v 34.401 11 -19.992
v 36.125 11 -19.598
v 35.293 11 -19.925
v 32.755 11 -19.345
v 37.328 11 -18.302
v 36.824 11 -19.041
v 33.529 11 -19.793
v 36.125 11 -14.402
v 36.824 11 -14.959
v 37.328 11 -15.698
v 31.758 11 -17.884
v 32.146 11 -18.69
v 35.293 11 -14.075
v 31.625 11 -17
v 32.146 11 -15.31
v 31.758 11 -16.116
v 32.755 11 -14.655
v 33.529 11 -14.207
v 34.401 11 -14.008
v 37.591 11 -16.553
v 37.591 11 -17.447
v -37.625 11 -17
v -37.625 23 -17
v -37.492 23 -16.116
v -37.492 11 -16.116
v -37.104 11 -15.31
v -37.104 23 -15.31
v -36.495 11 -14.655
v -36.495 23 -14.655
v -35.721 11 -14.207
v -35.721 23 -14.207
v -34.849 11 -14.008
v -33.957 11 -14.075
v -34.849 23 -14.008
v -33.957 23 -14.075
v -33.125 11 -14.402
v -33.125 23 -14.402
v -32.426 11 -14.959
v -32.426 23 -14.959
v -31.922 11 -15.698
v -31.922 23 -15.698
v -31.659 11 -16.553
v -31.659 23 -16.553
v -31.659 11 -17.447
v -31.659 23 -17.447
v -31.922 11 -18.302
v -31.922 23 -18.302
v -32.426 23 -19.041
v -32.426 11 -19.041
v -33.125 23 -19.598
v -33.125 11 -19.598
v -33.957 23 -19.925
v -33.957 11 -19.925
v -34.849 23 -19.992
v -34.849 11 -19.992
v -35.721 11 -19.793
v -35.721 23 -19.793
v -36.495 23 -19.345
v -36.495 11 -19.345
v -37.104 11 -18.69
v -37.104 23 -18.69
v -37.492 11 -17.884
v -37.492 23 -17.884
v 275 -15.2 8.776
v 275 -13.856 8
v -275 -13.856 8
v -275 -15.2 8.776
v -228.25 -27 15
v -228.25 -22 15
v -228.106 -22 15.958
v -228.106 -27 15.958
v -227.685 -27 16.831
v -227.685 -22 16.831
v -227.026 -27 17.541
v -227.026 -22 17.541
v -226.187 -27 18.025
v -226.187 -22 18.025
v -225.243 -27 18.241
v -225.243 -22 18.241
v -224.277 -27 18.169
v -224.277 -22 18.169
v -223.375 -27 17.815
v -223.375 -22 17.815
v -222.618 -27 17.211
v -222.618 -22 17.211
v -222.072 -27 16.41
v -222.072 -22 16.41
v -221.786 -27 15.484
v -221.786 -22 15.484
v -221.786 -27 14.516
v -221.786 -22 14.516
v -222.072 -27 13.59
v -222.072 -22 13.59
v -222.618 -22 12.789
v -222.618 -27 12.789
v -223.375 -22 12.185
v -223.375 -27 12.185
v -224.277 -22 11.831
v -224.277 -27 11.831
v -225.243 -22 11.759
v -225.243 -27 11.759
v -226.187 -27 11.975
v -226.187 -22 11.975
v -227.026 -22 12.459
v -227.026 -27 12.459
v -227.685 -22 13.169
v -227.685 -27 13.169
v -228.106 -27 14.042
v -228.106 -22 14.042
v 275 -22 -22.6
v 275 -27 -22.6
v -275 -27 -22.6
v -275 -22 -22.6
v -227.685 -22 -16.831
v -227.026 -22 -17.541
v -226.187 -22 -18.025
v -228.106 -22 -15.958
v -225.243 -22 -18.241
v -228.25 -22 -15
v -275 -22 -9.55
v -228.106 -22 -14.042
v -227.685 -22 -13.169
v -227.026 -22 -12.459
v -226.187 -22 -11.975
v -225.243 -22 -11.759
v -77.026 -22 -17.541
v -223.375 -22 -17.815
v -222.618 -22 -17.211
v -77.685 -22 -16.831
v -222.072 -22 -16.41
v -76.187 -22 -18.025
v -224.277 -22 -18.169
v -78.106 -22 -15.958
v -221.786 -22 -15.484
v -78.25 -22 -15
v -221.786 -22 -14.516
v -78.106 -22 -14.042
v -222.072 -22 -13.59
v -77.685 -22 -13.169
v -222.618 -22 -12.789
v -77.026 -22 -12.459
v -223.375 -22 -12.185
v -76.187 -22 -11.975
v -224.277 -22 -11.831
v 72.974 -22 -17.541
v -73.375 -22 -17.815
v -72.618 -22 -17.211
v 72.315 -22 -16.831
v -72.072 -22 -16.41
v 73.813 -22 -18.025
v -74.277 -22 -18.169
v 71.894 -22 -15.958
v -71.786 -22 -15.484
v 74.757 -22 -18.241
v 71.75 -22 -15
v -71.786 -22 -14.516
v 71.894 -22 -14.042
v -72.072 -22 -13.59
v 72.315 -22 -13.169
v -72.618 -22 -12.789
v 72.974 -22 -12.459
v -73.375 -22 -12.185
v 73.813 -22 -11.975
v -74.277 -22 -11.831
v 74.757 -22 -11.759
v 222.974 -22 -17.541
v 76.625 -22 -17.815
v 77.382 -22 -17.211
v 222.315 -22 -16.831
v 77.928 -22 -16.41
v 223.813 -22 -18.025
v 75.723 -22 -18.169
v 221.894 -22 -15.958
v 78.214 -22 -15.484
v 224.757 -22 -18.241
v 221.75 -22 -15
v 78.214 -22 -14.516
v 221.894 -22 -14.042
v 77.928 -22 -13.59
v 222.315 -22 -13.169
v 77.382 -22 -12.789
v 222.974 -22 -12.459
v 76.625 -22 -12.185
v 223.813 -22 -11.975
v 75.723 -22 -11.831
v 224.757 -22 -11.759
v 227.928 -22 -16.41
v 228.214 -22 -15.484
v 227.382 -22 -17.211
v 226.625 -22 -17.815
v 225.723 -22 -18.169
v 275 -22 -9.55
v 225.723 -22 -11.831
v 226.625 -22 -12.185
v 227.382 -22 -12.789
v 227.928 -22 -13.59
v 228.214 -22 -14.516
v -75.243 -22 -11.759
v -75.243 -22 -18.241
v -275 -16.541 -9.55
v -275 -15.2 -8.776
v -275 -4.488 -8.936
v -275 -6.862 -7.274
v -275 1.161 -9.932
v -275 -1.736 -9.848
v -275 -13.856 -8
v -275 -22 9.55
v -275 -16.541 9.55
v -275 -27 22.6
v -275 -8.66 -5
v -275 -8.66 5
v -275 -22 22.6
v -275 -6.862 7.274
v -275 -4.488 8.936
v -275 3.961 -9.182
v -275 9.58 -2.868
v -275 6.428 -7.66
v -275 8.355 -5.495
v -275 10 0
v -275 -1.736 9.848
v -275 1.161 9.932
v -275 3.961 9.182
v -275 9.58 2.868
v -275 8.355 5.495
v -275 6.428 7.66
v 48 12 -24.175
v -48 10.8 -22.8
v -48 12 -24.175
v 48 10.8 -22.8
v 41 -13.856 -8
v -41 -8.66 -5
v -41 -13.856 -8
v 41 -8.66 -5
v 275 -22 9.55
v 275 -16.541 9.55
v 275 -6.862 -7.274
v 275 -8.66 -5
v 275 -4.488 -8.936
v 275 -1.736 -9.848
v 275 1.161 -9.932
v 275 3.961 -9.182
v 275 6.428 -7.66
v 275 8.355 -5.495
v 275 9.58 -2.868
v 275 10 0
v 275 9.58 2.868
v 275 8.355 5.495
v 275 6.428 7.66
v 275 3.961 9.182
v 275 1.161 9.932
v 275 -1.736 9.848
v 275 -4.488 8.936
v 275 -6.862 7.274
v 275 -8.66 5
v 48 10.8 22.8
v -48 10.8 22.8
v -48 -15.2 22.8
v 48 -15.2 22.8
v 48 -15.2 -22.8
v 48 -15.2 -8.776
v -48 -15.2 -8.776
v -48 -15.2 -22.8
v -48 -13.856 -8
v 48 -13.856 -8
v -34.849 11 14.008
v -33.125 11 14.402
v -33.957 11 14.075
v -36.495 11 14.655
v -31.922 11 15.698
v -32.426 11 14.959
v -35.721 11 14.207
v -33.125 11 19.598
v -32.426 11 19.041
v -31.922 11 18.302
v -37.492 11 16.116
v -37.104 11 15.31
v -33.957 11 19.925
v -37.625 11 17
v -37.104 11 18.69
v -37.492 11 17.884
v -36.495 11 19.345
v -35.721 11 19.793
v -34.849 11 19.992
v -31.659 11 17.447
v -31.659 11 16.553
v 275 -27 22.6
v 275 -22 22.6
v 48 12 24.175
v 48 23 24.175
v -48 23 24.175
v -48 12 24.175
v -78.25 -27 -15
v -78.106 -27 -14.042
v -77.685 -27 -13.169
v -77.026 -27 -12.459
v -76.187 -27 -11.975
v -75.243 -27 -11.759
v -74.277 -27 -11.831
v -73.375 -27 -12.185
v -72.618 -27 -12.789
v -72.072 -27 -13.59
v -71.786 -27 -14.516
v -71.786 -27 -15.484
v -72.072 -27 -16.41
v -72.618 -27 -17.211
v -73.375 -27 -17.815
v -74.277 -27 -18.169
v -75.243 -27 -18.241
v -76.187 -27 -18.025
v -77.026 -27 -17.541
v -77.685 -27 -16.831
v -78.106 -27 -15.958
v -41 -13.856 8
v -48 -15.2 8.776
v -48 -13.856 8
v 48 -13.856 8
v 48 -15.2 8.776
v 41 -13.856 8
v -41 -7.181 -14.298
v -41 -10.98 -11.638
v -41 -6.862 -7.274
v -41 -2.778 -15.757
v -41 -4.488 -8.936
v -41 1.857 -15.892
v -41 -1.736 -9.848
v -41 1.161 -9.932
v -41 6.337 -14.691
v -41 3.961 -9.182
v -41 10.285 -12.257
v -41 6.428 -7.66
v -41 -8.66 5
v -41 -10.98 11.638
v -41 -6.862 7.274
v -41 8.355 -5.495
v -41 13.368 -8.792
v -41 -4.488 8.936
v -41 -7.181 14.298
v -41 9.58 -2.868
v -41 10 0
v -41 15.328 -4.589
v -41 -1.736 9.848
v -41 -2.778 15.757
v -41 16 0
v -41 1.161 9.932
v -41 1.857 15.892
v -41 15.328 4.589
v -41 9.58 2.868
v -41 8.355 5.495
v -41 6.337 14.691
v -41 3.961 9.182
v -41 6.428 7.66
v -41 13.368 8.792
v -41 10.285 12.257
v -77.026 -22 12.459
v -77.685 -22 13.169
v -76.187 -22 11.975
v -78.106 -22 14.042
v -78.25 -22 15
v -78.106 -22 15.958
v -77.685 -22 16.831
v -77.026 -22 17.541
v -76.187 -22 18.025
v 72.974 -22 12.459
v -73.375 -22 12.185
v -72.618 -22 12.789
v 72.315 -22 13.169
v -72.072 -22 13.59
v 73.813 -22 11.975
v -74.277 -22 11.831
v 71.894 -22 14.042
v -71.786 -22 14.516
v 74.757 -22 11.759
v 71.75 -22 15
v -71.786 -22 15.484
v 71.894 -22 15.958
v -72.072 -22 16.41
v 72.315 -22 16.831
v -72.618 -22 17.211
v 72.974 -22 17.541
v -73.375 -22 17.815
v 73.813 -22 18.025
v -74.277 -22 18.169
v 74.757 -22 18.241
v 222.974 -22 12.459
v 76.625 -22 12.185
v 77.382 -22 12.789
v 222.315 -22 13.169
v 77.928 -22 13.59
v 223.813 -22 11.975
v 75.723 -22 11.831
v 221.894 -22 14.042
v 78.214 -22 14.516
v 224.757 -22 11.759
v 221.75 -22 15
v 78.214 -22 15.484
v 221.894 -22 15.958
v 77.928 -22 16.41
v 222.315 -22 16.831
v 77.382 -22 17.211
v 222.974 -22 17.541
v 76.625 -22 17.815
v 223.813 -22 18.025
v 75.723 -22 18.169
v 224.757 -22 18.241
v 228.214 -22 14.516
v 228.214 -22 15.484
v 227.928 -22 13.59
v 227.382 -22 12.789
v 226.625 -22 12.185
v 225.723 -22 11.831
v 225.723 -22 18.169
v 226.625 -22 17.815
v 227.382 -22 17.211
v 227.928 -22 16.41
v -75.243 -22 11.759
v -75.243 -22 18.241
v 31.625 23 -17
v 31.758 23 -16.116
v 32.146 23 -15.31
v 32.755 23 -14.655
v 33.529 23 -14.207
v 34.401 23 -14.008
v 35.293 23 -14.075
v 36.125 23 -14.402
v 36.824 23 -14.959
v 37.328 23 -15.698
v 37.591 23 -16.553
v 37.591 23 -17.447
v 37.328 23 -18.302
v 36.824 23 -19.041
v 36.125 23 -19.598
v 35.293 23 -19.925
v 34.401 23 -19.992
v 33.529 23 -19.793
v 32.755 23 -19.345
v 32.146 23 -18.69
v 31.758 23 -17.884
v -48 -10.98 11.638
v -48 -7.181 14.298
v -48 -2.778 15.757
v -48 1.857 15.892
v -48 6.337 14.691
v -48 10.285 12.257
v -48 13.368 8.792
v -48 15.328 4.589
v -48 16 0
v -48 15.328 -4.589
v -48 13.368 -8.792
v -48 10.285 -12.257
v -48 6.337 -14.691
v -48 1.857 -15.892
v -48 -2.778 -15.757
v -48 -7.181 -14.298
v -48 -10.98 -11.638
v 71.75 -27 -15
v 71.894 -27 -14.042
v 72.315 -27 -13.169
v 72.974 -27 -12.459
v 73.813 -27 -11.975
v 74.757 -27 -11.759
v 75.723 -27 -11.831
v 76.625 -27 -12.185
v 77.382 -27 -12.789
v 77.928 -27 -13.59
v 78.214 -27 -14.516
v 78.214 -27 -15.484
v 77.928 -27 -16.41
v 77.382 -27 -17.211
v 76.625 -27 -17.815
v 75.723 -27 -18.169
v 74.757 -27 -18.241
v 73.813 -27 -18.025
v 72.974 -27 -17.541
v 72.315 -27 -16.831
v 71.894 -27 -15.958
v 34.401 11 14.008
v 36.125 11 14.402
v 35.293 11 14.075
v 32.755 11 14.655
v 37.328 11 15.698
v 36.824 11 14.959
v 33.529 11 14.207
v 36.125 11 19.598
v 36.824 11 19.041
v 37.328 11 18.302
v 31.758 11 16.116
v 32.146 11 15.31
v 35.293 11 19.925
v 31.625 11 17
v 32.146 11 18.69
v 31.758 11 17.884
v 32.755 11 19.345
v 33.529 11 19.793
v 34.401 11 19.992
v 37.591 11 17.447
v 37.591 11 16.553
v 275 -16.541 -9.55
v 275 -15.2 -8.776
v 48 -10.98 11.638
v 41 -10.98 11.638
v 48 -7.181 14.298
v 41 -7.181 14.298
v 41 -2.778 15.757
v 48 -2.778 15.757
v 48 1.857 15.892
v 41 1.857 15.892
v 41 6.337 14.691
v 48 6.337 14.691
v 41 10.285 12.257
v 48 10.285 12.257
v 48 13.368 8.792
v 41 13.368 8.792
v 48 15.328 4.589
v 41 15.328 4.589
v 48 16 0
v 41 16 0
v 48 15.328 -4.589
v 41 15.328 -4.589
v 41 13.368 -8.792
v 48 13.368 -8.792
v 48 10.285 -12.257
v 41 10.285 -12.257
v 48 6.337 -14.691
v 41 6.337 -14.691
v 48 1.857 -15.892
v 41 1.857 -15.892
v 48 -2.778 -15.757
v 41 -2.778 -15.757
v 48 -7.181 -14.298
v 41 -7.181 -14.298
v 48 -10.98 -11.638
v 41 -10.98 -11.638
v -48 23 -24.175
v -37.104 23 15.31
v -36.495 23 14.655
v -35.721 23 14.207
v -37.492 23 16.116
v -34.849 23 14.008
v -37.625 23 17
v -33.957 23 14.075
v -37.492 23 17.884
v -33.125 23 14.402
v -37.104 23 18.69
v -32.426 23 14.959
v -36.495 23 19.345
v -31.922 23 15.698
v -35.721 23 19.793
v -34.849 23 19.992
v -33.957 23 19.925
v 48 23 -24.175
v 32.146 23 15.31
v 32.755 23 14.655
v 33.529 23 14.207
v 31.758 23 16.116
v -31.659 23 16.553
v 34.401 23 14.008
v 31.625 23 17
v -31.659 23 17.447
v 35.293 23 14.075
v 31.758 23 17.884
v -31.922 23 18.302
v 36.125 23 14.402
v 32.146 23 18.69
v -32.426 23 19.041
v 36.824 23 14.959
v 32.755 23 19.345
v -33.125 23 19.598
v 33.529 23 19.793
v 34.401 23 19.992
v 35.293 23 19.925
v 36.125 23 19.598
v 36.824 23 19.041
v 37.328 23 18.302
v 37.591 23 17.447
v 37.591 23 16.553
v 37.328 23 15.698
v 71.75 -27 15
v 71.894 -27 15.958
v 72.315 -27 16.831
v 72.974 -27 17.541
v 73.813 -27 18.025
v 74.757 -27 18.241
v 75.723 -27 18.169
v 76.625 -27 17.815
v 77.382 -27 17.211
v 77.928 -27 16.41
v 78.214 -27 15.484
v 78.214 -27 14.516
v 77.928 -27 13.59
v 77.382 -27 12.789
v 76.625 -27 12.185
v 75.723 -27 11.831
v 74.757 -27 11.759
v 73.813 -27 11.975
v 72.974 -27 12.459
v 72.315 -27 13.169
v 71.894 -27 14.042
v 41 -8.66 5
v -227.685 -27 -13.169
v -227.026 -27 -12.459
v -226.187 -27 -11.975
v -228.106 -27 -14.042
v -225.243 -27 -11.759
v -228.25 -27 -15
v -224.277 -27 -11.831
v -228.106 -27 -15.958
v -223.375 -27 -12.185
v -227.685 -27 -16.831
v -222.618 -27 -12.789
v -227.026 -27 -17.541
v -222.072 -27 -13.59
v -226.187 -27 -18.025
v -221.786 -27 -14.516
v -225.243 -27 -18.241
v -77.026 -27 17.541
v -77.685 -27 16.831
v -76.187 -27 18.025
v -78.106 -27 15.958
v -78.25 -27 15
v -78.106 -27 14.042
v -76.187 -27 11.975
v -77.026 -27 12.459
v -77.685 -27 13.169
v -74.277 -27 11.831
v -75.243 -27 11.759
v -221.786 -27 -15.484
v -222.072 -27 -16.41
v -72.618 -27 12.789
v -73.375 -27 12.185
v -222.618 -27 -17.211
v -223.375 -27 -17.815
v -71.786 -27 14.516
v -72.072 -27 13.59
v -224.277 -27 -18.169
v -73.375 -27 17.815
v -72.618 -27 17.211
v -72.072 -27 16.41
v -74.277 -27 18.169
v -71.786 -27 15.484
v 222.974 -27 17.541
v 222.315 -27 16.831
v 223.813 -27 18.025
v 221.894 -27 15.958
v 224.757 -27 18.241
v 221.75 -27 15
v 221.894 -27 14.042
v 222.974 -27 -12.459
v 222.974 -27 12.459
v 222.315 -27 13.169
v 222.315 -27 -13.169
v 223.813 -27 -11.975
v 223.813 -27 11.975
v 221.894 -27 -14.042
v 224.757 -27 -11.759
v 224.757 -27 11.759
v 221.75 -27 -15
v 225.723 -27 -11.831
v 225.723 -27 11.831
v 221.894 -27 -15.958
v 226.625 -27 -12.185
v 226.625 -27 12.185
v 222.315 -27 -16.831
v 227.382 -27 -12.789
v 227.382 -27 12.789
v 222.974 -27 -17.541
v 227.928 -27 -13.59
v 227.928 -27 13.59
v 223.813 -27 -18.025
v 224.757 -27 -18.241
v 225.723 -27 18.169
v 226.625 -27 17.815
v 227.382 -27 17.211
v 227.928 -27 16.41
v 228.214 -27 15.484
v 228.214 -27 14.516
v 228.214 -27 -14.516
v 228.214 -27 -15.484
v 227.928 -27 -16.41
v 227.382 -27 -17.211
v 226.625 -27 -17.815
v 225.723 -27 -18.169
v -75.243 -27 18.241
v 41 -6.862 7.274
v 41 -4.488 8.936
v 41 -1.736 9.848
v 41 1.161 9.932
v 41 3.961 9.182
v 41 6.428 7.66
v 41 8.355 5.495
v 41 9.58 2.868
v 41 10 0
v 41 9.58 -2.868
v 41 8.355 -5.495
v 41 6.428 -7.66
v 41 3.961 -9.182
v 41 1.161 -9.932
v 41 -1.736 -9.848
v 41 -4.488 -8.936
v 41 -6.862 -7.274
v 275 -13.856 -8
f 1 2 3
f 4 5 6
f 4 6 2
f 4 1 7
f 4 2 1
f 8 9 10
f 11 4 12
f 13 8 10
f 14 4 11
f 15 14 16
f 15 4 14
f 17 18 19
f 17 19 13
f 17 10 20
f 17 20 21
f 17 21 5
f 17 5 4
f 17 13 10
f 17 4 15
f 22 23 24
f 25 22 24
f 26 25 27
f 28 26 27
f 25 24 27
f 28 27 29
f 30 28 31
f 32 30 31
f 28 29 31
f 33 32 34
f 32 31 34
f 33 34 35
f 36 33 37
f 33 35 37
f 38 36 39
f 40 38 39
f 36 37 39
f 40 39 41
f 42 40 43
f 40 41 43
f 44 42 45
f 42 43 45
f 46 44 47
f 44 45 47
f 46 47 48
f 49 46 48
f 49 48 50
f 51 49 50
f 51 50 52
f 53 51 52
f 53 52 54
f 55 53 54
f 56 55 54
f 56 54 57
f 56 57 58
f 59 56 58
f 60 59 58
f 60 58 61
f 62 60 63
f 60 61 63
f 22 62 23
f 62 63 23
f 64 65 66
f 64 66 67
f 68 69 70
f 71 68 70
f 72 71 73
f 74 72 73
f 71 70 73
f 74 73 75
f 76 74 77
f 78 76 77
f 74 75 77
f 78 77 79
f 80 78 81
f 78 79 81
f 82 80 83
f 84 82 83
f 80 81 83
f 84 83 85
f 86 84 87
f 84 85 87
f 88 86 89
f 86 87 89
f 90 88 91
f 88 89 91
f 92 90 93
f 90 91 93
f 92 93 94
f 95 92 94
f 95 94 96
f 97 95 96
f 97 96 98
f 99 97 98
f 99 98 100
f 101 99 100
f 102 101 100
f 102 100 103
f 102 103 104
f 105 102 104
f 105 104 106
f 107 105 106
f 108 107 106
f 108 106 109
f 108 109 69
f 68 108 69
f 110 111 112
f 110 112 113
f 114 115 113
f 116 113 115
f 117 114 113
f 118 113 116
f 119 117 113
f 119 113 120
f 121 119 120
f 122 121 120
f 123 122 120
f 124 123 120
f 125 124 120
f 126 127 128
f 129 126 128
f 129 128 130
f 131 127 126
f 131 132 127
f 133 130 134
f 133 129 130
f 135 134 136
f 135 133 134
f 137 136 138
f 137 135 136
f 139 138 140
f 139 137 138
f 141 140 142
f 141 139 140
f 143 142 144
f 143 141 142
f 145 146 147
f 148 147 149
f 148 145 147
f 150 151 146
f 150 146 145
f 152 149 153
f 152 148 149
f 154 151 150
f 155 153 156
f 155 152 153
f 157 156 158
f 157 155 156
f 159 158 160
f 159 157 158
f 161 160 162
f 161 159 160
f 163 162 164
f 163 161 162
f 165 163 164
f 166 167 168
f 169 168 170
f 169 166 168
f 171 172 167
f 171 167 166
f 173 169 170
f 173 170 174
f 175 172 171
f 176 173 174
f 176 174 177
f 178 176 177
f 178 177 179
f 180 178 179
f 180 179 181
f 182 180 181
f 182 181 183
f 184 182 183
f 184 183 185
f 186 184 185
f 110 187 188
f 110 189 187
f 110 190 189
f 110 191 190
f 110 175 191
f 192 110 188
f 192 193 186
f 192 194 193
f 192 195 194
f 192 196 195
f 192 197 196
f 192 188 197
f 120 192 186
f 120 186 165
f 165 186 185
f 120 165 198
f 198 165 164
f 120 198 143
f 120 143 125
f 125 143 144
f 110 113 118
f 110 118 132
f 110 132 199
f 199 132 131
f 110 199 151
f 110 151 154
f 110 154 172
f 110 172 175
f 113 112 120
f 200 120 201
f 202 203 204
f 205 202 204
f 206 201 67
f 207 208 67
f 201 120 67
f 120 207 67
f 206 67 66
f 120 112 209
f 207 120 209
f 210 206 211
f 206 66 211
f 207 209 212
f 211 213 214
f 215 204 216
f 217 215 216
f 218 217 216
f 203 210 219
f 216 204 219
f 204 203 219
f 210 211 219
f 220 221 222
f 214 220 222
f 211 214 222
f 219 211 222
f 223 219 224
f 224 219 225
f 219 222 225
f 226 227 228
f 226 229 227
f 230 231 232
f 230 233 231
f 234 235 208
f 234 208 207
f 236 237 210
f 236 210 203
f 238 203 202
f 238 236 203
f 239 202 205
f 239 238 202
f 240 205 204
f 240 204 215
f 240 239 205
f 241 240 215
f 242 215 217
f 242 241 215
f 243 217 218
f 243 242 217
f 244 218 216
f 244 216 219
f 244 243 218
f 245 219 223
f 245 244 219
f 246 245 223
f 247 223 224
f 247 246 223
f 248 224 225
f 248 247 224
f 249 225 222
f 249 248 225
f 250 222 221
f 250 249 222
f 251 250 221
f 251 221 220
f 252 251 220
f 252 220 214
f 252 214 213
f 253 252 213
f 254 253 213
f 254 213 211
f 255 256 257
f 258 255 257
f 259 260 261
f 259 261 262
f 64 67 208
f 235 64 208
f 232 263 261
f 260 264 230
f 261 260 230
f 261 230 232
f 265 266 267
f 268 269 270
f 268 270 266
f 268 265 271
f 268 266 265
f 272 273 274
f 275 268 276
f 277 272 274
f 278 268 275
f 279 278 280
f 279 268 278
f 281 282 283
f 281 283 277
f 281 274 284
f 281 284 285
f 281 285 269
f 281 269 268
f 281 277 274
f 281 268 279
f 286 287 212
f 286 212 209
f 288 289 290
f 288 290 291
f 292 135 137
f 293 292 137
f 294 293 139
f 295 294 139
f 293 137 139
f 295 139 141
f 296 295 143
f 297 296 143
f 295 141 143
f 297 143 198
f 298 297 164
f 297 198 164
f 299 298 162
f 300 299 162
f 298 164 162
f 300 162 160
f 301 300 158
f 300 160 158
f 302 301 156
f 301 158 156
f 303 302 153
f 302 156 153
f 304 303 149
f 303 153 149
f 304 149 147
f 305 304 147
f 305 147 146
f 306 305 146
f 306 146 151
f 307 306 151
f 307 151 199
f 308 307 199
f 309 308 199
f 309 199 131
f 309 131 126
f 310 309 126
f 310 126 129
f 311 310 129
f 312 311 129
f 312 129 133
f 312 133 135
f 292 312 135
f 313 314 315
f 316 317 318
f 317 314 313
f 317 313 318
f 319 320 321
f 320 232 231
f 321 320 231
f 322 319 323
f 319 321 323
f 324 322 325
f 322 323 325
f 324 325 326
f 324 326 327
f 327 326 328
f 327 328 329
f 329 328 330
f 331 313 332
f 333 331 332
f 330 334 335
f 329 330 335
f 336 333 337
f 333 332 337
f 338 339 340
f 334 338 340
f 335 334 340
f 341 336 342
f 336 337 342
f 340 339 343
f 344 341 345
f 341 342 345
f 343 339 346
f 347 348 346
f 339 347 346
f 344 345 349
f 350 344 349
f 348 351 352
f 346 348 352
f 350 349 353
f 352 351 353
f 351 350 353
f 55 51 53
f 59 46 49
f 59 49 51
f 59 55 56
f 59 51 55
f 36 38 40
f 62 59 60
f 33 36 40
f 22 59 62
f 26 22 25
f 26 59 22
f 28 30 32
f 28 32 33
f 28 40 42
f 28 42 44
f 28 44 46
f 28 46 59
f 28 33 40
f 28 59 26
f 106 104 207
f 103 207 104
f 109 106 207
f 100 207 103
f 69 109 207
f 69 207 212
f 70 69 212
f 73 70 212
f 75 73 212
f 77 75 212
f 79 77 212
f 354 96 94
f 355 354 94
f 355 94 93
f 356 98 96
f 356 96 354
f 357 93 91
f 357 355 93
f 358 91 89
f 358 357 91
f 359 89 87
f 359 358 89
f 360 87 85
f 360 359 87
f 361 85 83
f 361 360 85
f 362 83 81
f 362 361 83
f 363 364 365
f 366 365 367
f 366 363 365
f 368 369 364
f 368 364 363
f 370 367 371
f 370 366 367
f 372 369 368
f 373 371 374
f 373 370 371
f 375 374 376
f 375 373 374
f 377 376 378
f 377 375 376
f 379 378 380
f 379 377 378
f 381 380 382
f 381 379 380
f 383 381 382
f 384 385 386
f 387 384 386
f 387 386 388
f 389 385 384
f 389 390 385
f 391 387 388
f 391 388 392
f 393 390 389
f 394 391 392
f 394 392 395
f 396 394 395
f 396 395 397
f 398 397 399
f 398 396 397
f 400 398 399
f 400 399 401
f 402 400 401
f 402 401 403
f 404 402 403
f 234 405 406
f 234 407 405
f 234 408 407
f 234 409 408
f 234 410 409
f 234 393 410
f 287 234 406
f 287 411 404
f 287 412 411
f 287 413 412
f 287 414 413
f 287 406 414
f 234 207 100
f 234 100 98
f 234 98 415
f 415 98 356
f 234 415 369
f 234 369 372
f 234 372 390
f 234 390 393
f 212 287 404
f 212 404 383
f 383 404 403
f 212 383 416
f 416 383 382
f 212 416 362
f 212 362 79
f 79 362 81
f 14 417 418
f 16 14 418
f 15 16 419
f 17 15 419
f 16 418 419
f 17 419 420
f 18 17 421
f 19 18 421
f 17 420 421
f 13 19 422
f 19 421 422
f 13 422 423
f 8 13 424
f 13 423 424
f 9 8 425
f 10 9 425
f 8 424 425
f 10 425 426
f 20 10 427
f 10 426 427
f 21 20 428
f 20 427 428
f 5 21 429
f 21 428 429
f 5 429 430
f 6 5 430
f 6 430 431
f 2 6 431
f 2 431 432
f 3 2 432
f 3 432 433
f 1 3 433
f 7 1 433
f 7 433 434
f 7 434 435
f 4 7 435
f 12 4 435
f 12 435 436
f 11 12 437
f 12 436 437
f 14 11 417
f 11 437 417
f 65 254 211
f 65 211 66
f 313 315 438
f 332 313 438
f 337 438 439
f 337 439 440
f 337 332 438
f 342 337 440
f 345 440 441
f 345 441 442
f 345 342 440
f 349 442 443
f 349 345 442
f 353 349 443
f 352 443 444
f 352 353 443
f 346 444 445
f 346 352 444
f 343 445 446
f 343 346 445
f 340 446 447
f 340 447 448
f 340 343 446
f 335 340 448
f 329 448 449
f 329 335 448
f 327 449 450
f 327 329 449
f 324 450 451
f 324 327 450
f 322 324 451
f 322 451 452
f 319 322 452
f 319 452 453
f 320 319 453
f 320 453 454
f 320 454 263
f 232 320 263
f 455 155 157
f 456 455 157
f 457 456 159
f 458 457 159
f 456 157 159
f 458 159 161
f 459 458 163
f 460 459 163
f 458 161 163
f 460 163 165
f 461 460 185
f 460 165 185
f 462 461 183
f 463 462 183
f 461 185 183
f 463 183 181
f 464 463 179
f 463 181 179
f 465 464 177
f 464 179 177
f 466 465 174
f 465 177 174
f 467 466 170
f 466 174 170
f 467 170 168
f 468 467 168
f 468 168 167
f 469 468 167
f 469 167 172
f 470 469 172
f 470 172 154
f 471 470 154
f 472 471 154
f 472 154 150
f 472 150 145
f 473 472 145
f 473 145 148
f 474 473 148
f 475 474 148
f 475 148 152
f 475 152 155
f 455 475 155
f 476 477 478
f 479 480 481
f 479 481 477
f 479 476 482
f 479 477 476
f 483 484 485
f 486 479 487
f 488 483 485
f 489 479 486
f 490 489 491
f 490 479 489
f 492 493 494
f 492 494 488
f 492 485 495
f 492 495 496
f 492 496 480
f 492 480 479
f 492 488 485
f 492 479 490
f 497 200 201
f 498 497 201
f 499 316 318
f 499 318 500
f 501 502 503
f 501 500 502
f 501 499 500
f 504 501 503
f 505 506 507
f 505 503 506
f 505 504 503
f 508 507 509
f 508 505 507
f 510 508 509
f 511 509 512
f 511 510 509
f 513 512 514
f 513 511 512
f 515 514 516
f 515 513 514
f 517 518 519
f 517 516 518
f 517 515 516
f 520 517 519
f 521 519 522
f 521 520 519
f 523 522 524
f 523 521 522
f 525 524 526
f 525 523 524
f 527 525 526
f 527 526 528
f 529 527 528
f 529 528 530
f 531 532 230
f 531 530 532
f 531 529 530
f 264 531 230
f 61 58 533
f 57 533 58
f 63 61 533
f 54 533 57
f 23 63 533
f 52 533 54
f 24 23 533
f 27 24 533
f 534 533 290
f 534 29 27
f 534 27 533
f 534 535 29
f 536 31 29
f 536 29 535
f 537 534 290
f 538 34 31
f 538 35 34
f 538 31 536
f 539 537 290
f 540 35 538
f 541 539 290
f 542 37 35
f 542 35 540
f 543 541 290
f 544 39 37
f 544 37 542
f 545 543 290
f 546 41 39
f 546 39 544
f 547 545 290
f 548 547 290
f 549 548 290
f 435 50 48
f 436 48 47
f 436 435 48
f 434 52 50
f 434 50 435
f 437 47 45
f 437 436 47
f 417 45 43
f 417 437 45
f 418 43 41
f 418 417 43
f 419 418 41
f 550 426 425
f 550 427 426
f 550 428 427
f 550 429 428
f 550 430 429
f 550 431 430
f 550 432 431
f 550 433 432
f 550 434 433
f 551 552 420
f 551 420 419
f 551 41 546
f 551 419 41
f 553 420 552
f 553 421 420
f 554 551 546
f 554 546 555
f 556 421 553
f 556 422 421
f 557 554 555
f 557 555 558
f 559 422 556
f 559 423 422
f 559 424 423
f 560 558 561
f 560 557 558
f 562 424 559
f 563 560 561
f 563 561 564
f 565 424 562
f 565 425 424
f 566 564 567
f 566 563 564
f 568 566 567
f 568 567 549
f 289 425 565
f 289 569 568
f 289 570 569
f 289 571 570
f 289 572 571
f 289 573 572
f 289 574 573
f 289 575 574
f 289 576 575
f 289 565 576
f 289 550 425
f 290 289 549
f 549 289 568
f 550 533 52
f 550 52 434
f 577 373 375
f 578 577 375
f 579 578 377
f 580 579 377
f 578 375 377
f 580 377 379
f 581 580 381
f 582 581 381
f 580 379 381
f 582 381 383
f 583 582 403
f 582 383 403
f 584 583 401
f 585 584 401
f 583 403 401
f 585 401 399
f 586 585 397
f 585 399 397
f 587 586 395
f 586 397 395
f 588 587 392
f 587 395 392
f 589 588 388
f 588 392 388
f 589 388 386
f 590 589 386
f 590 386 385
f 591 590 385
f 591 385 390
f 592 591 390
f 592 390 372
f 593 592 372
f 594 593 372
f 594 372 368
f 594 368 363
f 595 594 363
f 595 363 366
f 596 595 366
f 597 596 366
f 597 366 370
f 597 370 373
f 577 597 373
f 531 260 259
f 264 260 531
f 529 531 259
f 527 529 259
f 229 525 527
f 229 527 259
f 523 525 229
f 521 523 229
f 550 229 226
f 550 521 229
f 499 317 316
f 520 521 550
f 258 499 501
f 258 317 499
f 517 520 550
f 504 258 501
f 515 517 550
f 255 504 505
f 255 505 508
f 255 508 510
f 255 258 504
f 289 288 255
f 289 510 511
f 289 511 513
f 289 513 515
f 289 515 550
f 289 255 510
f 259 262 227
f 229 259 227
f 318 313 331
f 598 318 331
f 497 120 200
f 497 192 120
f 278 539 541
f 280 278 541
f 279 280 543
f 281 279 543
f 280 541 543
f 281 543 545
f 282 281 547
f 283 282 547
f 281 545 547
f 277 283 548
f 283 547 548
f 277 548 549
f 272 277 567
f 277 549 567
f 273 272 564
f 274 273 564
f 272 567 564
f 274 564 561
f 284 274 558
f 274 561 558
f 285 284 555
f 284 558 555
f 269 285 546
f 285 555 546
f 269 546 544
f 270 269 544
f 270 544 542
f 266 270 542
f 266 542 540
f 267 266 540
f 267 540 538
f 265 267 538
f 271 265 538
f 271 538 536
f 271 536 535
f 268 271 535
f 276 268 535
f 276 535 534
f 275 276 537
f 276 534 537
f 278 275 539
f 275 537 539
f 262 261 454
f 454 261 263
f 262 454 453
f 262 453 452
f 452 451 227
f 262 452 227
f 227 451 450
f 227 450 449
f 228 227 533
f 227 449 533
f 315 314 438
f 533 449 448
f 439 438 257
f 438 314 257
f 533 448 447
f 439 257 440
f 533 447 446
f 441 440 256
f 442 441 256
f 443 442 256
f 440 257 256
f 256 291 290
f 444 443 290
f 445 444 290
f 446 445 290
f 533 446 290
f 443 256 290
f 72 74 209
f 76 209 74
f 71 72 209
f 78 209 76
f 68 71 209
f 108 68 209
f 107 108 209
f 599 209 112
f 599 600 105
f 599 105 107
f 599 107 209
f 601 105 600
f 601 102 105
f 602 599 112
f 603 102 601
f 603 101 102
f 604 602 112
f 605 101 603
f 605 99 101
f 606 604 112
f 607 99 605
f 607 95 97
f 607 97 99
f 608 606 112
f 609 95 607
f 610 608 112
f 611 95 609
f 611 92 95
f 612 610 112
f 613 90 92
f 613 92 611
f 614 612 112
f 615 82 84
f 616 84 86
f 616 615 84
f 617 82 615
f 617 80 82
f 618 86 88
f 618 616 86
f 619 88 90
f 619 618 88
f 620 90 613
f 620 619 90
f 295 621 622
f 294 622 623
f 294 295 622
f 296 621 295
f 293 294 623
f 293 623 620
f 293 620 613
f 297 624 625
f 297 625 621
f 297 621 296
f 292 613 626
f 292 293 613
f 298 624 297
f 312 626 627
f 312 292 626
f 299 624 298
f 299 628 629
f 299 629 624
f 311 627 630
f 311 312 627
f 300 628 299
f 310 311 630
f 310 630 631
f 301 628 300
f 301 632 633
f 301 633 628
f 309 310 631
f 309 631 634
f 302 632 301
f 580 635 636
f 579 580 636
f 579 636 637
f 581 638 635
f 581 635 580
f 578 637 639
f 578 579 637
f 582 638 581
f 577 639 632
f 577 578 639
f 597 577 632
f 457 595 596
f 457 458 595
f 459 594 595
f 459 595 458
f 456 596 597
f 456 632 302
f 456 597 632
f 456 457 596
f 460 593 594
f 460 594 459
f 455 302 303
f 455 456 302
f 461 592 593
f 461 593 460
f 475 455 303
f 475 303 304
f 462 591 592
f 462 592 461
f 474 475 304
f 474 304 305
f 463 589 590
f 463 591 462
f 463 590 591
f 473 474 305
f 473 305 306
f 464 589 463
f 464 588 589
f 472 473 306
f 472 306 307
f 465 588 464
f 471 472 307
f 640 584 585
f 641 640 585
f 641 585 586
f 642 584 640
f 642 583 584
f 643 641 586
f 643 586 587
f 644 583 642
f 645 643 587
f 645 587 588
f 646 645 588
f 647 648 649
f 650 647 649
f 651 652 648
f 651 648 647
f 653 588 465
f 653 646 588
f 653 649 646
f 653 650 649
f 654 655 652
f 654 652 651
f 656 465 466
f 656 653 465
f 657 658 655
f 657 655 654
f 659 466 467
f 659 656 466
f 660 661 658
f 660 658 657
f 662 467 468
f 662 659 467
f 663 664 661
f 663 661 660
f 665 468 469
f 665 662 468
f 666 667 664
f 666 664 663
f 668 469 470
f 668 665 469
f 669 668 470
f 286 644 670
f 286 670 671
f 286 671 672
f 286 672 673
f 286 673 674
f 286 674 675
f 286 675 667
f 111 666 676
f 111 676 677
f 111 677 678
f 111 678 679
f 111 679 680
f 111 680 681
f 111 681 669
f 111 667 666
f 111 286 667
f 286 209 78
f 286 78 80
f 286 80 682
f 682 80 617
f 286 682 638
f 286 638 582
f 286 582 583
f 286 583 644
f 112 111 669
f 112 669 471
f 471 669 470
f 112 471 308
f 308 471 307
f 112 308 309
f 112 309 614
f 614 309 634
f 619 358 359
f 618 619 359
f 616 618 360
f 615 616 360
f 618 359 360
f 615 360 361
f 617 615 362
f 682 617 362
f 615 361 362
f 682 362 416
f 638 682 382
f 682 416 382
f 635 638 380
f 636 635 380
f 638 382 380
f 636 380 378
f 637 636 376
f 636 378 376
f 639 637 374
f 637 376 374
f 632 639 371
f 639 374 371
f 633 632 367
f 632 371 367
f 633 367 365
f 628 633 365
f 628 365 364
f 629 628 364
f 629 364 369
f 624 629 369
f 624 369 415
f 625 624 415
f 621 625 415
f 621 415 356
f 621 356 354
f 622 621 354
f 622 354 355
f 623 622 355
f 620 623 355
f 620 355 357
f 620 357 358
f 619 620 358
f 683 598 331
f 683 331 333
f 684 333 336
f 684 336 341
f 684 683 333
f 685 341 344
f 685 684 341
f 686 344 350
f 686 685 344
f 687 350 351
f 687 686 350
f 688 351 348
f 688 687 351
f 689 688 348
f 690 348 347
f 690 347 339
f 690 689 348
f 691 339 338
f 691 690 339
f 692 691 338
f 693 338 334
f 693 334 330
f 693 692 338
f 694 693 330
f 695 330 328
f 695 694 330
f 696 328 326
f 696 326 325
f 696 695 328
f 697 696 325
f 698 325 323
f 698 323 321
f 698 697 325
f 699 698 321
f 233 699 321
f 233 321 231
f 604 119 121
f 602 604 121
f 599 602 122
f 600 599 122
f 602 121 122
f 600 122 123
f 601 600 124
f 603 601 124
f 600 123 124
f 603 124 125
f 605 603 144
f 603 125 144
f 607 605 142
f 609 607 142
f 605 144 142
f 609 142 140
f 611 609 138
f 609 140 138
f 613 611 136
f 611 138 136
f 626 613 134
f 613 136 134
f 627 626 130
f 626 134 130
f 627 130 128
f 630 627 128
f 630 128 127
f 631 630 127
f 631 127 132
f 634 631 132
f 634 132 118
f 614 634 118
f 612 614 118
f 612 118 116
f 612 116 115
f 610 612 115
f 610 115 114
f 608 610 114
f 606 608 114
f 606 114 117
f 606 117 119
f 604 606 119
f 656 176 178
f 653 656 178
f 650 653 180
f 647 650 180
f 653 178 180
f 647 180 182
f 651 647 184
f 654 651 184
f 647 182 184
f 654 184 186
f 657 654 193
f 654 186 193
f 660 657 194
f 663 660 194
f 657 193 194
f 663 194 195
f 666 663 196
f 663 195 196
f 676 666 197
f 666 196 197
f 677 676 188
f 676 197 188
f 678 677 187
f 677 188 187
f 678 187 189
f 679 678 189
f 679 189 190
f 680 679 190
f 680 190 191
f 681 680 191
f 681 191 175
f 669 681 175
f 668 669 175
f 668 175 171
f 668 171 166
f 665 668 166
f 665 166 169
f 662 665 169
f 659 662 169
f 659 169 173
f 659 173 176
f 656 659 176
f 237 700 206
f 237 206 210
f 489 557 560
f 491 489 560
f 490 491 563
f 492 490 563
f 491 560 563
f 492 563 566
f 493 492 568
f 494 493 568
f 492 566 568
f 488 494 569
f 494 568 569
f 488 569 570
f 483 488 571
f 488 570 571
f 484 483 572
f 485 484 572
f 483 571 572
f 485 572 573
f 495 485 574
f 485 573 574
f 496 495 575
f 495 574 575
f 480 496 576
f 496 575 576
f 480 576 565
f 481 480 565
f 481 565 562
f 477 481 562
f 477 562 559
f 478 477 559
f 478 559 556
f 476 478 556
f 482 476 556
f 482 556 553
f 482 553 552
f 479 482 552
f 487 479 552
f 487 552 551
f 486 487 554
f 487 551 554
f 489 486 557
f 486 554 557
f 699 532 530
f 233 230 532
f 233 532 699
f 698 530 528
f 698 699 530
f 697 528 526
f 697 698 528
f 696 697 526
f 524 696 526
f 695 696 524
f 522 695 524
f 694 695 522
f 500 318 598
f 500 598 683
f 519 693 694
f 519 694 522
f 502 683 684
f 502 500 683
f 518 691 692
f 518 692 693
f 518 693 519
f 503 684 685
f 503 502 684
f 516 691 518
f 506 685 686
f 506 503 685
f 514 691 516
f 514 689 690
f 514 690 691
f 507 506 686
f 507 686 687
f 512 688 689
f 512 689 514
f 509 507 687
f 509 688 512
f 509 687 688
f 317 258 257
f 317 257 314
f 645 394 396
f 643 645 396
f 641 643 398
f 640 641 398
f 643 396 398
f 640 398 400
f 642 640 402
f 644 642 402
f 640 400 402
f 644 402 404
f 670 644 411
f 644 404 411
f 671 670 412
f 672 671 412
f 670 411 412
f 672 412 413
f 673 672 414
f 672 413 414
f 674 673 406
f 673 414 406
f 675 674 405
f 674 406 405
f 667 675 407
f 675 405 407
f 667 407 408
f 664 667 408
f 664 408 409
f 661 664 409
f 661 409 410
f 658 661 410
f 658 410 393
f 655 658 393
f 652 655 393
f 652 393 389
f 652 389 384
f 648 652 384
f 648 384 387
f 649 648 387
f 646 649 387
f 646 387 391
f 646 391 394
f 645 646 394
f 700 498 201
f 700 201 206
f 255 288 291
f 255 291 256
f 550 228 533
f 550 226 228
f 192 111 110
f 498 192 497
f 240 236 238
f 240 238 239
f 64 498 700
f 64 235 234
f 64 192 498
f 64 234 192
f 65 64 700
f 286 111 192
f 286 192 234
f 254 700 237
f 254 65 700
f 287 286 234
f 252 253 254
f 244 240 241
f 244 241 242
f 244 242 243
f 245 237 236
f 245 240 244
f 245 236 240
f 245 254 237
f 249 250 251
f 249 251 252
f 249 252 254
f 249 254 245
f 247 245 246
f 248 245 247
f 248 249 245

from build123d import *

# Parameters (mm, degrees)
F1_DEPTH = 48
F3_DEPTH = 41
F4_DEPTH = 275
F5_R     = 3
F6_DEPTH = 12
F7_R     = 3.25
F8_DEPTH = 25


with BuildPart() as f1:
    # F0 (on Right) → F1 (new body, symmetric)
    with BuildSketch(Plane.YZ):
        with BuildLine():
            Line((23, -24.175), (23, 0))
            Line((23, 0), (23, 24.175))
            Line((23, 24.175), (12, 24.175))
            Line((12, 24.175), (10.8, 22.8))
            Line((10.8, 22.8), (-15.2, 22.8))
            Line((-15.2, 22.8), (-15.2, 8.7757240917))
            Line((-15.2, 8.7757240917), (-13.8564064606, 8))
            ThreePointArc((-13.8564064606, 8), (4.1411047216, 15.4548132206), (16, 0))
            ThreePointArc((16, 0), (4.1411047216, -15.4548132206), (-13.8564064606, -8))
            Line((-13.8564064606, -8), (-15.2, -8.7757240917))
            Line((-15.2, -8.7757240917), (-15.2, -22.8))
            Line((-15.2, -22.8), (10.8, -22.8))
            Line((10.8, -22.8), (12, -24.175))
            Line((12, -24.175), (23, -24.175))
        make_face()
    extrude(amount=F1_DEPTH, both=True)

    # F0 (on Right) → F3 (join, symmetric)
    with BuildSketch(Plane.YZ):
        with BuildLine():
            Line((-8.6602540378, -5), (-13.8564064606, -8))
            ThreePointArc((-13.8564064606, -8), (4.1411047216, -15.4548132206), (16, 0))
            ThreePointArc((16, 0), (4.1411047216, 15.4548132206), (-13.8564064606, 8))
            Line((-13.8564064606, 8), (-8.6602540378, 5))
            ThreePointArc((-8.6602540378, 5), (2.588190451, 9.6592582629), (10, 0))
            ThreePointArc((10, 0), (2.588190451, -9.6592582629), (-8.6602540378, -5))
        make_face()
    extrude(amount=F3_DEPTH, both=True)

    # F5 (on face) → F6 (cut)
    with BuildSketch(Plane(origin=(0, 23, 0), x_dir=(-1, 0, 0), z_dir=(0, 1, 0))):
        with Locations((-34.625, 17)):
            Circle(F5_R)
        with Locations((34.625, 17)):
            Circle(F5_R)
        with Locations((34.625, -17)):
            Circle(F5_R)
        with Locations((-34.625, -17)):
            Circle(F5_R)
    extrude(amount=-F6_DEPTH, mode=Mode.SUBTRACT)


with BuildPart() as f4:
    # F0 (on Right) → F4 (new body, symmetric)
    with BuildSketch(Plane.YZ):
        with BuildLine():
            Line((-16.5410852123, -9.55), (-15.2, -8.7757240917))
            Line((-15.2, -8.7757240917), (-13.8564064606, -8))
            Line((-13.8564064606, -8), (-8.6602540378, -5))
            ThreePointArc((-8.6602540378, -5), (2.588190451, -9.6592582629), (10, 0))
            ThreePointArc((10, 0), (2.588190451, 9.6592582629), (-8.6602540378, 5))
            Line((-8.6602540378, 5), (-13.8564064606, 8))
            Line((-13.8564064606, 8), (-15.2, 8.7757240917))
            Line((-15.2, 8.7757240917), (-16.5410852123, 9.55))
            Line((-16.5410852123, 9.55), (-22, 9.55))
            Line((-22, 9.55), (-22, 12.7017059222))
            Line((-22, 12.7017059222), (-22, 22.6))
            Line((-22, 22.6), (-27, 22.6))
            Line((-27, 22.6), (-27, 0))
            Line((-27, 0), (-27, -22.6))
            Line((-27, -22.6), (-22, -22.6))
            Line((-22, -22.6), (-22, -12.7017059222))
            Line((-22, -12.7017059222), (-22, -9.55))
            Line((-22, -9.55), (-16.5410852123, -9.55))
        make_face()
    extrude(amount=F4_DEPTH, both=True)

    # F7 (on face) → F8 (cut)
    with BuildSketch(Plane(origin=(0, -22, 0), x_dir=(-1, 0, 0), z_dir=(0, 1, 0))):
        with Locations((-225, 15)):
            Circle(F7_R)
        with Locations((-75, 15)):
            Circle(F7_R)
        with Locations((-225, -15)):
            Circle(F7_R)
        with Locations((-75, -15)):
            Circle(F7_R)
        with Locations((75, 15)):
            Circle(F7_R)
        with Locations((225, 15)):
            Circle(F7_R)
        with Locations((225, -15)):
            Circle(F7_R)
        with Locations((75, -15)):
            Circle(F7_R)
    extrude(amount=-F8_DEPTH, mode=Mode.SUBTRACT)


solid = Compound([f1.part, f4.part])
